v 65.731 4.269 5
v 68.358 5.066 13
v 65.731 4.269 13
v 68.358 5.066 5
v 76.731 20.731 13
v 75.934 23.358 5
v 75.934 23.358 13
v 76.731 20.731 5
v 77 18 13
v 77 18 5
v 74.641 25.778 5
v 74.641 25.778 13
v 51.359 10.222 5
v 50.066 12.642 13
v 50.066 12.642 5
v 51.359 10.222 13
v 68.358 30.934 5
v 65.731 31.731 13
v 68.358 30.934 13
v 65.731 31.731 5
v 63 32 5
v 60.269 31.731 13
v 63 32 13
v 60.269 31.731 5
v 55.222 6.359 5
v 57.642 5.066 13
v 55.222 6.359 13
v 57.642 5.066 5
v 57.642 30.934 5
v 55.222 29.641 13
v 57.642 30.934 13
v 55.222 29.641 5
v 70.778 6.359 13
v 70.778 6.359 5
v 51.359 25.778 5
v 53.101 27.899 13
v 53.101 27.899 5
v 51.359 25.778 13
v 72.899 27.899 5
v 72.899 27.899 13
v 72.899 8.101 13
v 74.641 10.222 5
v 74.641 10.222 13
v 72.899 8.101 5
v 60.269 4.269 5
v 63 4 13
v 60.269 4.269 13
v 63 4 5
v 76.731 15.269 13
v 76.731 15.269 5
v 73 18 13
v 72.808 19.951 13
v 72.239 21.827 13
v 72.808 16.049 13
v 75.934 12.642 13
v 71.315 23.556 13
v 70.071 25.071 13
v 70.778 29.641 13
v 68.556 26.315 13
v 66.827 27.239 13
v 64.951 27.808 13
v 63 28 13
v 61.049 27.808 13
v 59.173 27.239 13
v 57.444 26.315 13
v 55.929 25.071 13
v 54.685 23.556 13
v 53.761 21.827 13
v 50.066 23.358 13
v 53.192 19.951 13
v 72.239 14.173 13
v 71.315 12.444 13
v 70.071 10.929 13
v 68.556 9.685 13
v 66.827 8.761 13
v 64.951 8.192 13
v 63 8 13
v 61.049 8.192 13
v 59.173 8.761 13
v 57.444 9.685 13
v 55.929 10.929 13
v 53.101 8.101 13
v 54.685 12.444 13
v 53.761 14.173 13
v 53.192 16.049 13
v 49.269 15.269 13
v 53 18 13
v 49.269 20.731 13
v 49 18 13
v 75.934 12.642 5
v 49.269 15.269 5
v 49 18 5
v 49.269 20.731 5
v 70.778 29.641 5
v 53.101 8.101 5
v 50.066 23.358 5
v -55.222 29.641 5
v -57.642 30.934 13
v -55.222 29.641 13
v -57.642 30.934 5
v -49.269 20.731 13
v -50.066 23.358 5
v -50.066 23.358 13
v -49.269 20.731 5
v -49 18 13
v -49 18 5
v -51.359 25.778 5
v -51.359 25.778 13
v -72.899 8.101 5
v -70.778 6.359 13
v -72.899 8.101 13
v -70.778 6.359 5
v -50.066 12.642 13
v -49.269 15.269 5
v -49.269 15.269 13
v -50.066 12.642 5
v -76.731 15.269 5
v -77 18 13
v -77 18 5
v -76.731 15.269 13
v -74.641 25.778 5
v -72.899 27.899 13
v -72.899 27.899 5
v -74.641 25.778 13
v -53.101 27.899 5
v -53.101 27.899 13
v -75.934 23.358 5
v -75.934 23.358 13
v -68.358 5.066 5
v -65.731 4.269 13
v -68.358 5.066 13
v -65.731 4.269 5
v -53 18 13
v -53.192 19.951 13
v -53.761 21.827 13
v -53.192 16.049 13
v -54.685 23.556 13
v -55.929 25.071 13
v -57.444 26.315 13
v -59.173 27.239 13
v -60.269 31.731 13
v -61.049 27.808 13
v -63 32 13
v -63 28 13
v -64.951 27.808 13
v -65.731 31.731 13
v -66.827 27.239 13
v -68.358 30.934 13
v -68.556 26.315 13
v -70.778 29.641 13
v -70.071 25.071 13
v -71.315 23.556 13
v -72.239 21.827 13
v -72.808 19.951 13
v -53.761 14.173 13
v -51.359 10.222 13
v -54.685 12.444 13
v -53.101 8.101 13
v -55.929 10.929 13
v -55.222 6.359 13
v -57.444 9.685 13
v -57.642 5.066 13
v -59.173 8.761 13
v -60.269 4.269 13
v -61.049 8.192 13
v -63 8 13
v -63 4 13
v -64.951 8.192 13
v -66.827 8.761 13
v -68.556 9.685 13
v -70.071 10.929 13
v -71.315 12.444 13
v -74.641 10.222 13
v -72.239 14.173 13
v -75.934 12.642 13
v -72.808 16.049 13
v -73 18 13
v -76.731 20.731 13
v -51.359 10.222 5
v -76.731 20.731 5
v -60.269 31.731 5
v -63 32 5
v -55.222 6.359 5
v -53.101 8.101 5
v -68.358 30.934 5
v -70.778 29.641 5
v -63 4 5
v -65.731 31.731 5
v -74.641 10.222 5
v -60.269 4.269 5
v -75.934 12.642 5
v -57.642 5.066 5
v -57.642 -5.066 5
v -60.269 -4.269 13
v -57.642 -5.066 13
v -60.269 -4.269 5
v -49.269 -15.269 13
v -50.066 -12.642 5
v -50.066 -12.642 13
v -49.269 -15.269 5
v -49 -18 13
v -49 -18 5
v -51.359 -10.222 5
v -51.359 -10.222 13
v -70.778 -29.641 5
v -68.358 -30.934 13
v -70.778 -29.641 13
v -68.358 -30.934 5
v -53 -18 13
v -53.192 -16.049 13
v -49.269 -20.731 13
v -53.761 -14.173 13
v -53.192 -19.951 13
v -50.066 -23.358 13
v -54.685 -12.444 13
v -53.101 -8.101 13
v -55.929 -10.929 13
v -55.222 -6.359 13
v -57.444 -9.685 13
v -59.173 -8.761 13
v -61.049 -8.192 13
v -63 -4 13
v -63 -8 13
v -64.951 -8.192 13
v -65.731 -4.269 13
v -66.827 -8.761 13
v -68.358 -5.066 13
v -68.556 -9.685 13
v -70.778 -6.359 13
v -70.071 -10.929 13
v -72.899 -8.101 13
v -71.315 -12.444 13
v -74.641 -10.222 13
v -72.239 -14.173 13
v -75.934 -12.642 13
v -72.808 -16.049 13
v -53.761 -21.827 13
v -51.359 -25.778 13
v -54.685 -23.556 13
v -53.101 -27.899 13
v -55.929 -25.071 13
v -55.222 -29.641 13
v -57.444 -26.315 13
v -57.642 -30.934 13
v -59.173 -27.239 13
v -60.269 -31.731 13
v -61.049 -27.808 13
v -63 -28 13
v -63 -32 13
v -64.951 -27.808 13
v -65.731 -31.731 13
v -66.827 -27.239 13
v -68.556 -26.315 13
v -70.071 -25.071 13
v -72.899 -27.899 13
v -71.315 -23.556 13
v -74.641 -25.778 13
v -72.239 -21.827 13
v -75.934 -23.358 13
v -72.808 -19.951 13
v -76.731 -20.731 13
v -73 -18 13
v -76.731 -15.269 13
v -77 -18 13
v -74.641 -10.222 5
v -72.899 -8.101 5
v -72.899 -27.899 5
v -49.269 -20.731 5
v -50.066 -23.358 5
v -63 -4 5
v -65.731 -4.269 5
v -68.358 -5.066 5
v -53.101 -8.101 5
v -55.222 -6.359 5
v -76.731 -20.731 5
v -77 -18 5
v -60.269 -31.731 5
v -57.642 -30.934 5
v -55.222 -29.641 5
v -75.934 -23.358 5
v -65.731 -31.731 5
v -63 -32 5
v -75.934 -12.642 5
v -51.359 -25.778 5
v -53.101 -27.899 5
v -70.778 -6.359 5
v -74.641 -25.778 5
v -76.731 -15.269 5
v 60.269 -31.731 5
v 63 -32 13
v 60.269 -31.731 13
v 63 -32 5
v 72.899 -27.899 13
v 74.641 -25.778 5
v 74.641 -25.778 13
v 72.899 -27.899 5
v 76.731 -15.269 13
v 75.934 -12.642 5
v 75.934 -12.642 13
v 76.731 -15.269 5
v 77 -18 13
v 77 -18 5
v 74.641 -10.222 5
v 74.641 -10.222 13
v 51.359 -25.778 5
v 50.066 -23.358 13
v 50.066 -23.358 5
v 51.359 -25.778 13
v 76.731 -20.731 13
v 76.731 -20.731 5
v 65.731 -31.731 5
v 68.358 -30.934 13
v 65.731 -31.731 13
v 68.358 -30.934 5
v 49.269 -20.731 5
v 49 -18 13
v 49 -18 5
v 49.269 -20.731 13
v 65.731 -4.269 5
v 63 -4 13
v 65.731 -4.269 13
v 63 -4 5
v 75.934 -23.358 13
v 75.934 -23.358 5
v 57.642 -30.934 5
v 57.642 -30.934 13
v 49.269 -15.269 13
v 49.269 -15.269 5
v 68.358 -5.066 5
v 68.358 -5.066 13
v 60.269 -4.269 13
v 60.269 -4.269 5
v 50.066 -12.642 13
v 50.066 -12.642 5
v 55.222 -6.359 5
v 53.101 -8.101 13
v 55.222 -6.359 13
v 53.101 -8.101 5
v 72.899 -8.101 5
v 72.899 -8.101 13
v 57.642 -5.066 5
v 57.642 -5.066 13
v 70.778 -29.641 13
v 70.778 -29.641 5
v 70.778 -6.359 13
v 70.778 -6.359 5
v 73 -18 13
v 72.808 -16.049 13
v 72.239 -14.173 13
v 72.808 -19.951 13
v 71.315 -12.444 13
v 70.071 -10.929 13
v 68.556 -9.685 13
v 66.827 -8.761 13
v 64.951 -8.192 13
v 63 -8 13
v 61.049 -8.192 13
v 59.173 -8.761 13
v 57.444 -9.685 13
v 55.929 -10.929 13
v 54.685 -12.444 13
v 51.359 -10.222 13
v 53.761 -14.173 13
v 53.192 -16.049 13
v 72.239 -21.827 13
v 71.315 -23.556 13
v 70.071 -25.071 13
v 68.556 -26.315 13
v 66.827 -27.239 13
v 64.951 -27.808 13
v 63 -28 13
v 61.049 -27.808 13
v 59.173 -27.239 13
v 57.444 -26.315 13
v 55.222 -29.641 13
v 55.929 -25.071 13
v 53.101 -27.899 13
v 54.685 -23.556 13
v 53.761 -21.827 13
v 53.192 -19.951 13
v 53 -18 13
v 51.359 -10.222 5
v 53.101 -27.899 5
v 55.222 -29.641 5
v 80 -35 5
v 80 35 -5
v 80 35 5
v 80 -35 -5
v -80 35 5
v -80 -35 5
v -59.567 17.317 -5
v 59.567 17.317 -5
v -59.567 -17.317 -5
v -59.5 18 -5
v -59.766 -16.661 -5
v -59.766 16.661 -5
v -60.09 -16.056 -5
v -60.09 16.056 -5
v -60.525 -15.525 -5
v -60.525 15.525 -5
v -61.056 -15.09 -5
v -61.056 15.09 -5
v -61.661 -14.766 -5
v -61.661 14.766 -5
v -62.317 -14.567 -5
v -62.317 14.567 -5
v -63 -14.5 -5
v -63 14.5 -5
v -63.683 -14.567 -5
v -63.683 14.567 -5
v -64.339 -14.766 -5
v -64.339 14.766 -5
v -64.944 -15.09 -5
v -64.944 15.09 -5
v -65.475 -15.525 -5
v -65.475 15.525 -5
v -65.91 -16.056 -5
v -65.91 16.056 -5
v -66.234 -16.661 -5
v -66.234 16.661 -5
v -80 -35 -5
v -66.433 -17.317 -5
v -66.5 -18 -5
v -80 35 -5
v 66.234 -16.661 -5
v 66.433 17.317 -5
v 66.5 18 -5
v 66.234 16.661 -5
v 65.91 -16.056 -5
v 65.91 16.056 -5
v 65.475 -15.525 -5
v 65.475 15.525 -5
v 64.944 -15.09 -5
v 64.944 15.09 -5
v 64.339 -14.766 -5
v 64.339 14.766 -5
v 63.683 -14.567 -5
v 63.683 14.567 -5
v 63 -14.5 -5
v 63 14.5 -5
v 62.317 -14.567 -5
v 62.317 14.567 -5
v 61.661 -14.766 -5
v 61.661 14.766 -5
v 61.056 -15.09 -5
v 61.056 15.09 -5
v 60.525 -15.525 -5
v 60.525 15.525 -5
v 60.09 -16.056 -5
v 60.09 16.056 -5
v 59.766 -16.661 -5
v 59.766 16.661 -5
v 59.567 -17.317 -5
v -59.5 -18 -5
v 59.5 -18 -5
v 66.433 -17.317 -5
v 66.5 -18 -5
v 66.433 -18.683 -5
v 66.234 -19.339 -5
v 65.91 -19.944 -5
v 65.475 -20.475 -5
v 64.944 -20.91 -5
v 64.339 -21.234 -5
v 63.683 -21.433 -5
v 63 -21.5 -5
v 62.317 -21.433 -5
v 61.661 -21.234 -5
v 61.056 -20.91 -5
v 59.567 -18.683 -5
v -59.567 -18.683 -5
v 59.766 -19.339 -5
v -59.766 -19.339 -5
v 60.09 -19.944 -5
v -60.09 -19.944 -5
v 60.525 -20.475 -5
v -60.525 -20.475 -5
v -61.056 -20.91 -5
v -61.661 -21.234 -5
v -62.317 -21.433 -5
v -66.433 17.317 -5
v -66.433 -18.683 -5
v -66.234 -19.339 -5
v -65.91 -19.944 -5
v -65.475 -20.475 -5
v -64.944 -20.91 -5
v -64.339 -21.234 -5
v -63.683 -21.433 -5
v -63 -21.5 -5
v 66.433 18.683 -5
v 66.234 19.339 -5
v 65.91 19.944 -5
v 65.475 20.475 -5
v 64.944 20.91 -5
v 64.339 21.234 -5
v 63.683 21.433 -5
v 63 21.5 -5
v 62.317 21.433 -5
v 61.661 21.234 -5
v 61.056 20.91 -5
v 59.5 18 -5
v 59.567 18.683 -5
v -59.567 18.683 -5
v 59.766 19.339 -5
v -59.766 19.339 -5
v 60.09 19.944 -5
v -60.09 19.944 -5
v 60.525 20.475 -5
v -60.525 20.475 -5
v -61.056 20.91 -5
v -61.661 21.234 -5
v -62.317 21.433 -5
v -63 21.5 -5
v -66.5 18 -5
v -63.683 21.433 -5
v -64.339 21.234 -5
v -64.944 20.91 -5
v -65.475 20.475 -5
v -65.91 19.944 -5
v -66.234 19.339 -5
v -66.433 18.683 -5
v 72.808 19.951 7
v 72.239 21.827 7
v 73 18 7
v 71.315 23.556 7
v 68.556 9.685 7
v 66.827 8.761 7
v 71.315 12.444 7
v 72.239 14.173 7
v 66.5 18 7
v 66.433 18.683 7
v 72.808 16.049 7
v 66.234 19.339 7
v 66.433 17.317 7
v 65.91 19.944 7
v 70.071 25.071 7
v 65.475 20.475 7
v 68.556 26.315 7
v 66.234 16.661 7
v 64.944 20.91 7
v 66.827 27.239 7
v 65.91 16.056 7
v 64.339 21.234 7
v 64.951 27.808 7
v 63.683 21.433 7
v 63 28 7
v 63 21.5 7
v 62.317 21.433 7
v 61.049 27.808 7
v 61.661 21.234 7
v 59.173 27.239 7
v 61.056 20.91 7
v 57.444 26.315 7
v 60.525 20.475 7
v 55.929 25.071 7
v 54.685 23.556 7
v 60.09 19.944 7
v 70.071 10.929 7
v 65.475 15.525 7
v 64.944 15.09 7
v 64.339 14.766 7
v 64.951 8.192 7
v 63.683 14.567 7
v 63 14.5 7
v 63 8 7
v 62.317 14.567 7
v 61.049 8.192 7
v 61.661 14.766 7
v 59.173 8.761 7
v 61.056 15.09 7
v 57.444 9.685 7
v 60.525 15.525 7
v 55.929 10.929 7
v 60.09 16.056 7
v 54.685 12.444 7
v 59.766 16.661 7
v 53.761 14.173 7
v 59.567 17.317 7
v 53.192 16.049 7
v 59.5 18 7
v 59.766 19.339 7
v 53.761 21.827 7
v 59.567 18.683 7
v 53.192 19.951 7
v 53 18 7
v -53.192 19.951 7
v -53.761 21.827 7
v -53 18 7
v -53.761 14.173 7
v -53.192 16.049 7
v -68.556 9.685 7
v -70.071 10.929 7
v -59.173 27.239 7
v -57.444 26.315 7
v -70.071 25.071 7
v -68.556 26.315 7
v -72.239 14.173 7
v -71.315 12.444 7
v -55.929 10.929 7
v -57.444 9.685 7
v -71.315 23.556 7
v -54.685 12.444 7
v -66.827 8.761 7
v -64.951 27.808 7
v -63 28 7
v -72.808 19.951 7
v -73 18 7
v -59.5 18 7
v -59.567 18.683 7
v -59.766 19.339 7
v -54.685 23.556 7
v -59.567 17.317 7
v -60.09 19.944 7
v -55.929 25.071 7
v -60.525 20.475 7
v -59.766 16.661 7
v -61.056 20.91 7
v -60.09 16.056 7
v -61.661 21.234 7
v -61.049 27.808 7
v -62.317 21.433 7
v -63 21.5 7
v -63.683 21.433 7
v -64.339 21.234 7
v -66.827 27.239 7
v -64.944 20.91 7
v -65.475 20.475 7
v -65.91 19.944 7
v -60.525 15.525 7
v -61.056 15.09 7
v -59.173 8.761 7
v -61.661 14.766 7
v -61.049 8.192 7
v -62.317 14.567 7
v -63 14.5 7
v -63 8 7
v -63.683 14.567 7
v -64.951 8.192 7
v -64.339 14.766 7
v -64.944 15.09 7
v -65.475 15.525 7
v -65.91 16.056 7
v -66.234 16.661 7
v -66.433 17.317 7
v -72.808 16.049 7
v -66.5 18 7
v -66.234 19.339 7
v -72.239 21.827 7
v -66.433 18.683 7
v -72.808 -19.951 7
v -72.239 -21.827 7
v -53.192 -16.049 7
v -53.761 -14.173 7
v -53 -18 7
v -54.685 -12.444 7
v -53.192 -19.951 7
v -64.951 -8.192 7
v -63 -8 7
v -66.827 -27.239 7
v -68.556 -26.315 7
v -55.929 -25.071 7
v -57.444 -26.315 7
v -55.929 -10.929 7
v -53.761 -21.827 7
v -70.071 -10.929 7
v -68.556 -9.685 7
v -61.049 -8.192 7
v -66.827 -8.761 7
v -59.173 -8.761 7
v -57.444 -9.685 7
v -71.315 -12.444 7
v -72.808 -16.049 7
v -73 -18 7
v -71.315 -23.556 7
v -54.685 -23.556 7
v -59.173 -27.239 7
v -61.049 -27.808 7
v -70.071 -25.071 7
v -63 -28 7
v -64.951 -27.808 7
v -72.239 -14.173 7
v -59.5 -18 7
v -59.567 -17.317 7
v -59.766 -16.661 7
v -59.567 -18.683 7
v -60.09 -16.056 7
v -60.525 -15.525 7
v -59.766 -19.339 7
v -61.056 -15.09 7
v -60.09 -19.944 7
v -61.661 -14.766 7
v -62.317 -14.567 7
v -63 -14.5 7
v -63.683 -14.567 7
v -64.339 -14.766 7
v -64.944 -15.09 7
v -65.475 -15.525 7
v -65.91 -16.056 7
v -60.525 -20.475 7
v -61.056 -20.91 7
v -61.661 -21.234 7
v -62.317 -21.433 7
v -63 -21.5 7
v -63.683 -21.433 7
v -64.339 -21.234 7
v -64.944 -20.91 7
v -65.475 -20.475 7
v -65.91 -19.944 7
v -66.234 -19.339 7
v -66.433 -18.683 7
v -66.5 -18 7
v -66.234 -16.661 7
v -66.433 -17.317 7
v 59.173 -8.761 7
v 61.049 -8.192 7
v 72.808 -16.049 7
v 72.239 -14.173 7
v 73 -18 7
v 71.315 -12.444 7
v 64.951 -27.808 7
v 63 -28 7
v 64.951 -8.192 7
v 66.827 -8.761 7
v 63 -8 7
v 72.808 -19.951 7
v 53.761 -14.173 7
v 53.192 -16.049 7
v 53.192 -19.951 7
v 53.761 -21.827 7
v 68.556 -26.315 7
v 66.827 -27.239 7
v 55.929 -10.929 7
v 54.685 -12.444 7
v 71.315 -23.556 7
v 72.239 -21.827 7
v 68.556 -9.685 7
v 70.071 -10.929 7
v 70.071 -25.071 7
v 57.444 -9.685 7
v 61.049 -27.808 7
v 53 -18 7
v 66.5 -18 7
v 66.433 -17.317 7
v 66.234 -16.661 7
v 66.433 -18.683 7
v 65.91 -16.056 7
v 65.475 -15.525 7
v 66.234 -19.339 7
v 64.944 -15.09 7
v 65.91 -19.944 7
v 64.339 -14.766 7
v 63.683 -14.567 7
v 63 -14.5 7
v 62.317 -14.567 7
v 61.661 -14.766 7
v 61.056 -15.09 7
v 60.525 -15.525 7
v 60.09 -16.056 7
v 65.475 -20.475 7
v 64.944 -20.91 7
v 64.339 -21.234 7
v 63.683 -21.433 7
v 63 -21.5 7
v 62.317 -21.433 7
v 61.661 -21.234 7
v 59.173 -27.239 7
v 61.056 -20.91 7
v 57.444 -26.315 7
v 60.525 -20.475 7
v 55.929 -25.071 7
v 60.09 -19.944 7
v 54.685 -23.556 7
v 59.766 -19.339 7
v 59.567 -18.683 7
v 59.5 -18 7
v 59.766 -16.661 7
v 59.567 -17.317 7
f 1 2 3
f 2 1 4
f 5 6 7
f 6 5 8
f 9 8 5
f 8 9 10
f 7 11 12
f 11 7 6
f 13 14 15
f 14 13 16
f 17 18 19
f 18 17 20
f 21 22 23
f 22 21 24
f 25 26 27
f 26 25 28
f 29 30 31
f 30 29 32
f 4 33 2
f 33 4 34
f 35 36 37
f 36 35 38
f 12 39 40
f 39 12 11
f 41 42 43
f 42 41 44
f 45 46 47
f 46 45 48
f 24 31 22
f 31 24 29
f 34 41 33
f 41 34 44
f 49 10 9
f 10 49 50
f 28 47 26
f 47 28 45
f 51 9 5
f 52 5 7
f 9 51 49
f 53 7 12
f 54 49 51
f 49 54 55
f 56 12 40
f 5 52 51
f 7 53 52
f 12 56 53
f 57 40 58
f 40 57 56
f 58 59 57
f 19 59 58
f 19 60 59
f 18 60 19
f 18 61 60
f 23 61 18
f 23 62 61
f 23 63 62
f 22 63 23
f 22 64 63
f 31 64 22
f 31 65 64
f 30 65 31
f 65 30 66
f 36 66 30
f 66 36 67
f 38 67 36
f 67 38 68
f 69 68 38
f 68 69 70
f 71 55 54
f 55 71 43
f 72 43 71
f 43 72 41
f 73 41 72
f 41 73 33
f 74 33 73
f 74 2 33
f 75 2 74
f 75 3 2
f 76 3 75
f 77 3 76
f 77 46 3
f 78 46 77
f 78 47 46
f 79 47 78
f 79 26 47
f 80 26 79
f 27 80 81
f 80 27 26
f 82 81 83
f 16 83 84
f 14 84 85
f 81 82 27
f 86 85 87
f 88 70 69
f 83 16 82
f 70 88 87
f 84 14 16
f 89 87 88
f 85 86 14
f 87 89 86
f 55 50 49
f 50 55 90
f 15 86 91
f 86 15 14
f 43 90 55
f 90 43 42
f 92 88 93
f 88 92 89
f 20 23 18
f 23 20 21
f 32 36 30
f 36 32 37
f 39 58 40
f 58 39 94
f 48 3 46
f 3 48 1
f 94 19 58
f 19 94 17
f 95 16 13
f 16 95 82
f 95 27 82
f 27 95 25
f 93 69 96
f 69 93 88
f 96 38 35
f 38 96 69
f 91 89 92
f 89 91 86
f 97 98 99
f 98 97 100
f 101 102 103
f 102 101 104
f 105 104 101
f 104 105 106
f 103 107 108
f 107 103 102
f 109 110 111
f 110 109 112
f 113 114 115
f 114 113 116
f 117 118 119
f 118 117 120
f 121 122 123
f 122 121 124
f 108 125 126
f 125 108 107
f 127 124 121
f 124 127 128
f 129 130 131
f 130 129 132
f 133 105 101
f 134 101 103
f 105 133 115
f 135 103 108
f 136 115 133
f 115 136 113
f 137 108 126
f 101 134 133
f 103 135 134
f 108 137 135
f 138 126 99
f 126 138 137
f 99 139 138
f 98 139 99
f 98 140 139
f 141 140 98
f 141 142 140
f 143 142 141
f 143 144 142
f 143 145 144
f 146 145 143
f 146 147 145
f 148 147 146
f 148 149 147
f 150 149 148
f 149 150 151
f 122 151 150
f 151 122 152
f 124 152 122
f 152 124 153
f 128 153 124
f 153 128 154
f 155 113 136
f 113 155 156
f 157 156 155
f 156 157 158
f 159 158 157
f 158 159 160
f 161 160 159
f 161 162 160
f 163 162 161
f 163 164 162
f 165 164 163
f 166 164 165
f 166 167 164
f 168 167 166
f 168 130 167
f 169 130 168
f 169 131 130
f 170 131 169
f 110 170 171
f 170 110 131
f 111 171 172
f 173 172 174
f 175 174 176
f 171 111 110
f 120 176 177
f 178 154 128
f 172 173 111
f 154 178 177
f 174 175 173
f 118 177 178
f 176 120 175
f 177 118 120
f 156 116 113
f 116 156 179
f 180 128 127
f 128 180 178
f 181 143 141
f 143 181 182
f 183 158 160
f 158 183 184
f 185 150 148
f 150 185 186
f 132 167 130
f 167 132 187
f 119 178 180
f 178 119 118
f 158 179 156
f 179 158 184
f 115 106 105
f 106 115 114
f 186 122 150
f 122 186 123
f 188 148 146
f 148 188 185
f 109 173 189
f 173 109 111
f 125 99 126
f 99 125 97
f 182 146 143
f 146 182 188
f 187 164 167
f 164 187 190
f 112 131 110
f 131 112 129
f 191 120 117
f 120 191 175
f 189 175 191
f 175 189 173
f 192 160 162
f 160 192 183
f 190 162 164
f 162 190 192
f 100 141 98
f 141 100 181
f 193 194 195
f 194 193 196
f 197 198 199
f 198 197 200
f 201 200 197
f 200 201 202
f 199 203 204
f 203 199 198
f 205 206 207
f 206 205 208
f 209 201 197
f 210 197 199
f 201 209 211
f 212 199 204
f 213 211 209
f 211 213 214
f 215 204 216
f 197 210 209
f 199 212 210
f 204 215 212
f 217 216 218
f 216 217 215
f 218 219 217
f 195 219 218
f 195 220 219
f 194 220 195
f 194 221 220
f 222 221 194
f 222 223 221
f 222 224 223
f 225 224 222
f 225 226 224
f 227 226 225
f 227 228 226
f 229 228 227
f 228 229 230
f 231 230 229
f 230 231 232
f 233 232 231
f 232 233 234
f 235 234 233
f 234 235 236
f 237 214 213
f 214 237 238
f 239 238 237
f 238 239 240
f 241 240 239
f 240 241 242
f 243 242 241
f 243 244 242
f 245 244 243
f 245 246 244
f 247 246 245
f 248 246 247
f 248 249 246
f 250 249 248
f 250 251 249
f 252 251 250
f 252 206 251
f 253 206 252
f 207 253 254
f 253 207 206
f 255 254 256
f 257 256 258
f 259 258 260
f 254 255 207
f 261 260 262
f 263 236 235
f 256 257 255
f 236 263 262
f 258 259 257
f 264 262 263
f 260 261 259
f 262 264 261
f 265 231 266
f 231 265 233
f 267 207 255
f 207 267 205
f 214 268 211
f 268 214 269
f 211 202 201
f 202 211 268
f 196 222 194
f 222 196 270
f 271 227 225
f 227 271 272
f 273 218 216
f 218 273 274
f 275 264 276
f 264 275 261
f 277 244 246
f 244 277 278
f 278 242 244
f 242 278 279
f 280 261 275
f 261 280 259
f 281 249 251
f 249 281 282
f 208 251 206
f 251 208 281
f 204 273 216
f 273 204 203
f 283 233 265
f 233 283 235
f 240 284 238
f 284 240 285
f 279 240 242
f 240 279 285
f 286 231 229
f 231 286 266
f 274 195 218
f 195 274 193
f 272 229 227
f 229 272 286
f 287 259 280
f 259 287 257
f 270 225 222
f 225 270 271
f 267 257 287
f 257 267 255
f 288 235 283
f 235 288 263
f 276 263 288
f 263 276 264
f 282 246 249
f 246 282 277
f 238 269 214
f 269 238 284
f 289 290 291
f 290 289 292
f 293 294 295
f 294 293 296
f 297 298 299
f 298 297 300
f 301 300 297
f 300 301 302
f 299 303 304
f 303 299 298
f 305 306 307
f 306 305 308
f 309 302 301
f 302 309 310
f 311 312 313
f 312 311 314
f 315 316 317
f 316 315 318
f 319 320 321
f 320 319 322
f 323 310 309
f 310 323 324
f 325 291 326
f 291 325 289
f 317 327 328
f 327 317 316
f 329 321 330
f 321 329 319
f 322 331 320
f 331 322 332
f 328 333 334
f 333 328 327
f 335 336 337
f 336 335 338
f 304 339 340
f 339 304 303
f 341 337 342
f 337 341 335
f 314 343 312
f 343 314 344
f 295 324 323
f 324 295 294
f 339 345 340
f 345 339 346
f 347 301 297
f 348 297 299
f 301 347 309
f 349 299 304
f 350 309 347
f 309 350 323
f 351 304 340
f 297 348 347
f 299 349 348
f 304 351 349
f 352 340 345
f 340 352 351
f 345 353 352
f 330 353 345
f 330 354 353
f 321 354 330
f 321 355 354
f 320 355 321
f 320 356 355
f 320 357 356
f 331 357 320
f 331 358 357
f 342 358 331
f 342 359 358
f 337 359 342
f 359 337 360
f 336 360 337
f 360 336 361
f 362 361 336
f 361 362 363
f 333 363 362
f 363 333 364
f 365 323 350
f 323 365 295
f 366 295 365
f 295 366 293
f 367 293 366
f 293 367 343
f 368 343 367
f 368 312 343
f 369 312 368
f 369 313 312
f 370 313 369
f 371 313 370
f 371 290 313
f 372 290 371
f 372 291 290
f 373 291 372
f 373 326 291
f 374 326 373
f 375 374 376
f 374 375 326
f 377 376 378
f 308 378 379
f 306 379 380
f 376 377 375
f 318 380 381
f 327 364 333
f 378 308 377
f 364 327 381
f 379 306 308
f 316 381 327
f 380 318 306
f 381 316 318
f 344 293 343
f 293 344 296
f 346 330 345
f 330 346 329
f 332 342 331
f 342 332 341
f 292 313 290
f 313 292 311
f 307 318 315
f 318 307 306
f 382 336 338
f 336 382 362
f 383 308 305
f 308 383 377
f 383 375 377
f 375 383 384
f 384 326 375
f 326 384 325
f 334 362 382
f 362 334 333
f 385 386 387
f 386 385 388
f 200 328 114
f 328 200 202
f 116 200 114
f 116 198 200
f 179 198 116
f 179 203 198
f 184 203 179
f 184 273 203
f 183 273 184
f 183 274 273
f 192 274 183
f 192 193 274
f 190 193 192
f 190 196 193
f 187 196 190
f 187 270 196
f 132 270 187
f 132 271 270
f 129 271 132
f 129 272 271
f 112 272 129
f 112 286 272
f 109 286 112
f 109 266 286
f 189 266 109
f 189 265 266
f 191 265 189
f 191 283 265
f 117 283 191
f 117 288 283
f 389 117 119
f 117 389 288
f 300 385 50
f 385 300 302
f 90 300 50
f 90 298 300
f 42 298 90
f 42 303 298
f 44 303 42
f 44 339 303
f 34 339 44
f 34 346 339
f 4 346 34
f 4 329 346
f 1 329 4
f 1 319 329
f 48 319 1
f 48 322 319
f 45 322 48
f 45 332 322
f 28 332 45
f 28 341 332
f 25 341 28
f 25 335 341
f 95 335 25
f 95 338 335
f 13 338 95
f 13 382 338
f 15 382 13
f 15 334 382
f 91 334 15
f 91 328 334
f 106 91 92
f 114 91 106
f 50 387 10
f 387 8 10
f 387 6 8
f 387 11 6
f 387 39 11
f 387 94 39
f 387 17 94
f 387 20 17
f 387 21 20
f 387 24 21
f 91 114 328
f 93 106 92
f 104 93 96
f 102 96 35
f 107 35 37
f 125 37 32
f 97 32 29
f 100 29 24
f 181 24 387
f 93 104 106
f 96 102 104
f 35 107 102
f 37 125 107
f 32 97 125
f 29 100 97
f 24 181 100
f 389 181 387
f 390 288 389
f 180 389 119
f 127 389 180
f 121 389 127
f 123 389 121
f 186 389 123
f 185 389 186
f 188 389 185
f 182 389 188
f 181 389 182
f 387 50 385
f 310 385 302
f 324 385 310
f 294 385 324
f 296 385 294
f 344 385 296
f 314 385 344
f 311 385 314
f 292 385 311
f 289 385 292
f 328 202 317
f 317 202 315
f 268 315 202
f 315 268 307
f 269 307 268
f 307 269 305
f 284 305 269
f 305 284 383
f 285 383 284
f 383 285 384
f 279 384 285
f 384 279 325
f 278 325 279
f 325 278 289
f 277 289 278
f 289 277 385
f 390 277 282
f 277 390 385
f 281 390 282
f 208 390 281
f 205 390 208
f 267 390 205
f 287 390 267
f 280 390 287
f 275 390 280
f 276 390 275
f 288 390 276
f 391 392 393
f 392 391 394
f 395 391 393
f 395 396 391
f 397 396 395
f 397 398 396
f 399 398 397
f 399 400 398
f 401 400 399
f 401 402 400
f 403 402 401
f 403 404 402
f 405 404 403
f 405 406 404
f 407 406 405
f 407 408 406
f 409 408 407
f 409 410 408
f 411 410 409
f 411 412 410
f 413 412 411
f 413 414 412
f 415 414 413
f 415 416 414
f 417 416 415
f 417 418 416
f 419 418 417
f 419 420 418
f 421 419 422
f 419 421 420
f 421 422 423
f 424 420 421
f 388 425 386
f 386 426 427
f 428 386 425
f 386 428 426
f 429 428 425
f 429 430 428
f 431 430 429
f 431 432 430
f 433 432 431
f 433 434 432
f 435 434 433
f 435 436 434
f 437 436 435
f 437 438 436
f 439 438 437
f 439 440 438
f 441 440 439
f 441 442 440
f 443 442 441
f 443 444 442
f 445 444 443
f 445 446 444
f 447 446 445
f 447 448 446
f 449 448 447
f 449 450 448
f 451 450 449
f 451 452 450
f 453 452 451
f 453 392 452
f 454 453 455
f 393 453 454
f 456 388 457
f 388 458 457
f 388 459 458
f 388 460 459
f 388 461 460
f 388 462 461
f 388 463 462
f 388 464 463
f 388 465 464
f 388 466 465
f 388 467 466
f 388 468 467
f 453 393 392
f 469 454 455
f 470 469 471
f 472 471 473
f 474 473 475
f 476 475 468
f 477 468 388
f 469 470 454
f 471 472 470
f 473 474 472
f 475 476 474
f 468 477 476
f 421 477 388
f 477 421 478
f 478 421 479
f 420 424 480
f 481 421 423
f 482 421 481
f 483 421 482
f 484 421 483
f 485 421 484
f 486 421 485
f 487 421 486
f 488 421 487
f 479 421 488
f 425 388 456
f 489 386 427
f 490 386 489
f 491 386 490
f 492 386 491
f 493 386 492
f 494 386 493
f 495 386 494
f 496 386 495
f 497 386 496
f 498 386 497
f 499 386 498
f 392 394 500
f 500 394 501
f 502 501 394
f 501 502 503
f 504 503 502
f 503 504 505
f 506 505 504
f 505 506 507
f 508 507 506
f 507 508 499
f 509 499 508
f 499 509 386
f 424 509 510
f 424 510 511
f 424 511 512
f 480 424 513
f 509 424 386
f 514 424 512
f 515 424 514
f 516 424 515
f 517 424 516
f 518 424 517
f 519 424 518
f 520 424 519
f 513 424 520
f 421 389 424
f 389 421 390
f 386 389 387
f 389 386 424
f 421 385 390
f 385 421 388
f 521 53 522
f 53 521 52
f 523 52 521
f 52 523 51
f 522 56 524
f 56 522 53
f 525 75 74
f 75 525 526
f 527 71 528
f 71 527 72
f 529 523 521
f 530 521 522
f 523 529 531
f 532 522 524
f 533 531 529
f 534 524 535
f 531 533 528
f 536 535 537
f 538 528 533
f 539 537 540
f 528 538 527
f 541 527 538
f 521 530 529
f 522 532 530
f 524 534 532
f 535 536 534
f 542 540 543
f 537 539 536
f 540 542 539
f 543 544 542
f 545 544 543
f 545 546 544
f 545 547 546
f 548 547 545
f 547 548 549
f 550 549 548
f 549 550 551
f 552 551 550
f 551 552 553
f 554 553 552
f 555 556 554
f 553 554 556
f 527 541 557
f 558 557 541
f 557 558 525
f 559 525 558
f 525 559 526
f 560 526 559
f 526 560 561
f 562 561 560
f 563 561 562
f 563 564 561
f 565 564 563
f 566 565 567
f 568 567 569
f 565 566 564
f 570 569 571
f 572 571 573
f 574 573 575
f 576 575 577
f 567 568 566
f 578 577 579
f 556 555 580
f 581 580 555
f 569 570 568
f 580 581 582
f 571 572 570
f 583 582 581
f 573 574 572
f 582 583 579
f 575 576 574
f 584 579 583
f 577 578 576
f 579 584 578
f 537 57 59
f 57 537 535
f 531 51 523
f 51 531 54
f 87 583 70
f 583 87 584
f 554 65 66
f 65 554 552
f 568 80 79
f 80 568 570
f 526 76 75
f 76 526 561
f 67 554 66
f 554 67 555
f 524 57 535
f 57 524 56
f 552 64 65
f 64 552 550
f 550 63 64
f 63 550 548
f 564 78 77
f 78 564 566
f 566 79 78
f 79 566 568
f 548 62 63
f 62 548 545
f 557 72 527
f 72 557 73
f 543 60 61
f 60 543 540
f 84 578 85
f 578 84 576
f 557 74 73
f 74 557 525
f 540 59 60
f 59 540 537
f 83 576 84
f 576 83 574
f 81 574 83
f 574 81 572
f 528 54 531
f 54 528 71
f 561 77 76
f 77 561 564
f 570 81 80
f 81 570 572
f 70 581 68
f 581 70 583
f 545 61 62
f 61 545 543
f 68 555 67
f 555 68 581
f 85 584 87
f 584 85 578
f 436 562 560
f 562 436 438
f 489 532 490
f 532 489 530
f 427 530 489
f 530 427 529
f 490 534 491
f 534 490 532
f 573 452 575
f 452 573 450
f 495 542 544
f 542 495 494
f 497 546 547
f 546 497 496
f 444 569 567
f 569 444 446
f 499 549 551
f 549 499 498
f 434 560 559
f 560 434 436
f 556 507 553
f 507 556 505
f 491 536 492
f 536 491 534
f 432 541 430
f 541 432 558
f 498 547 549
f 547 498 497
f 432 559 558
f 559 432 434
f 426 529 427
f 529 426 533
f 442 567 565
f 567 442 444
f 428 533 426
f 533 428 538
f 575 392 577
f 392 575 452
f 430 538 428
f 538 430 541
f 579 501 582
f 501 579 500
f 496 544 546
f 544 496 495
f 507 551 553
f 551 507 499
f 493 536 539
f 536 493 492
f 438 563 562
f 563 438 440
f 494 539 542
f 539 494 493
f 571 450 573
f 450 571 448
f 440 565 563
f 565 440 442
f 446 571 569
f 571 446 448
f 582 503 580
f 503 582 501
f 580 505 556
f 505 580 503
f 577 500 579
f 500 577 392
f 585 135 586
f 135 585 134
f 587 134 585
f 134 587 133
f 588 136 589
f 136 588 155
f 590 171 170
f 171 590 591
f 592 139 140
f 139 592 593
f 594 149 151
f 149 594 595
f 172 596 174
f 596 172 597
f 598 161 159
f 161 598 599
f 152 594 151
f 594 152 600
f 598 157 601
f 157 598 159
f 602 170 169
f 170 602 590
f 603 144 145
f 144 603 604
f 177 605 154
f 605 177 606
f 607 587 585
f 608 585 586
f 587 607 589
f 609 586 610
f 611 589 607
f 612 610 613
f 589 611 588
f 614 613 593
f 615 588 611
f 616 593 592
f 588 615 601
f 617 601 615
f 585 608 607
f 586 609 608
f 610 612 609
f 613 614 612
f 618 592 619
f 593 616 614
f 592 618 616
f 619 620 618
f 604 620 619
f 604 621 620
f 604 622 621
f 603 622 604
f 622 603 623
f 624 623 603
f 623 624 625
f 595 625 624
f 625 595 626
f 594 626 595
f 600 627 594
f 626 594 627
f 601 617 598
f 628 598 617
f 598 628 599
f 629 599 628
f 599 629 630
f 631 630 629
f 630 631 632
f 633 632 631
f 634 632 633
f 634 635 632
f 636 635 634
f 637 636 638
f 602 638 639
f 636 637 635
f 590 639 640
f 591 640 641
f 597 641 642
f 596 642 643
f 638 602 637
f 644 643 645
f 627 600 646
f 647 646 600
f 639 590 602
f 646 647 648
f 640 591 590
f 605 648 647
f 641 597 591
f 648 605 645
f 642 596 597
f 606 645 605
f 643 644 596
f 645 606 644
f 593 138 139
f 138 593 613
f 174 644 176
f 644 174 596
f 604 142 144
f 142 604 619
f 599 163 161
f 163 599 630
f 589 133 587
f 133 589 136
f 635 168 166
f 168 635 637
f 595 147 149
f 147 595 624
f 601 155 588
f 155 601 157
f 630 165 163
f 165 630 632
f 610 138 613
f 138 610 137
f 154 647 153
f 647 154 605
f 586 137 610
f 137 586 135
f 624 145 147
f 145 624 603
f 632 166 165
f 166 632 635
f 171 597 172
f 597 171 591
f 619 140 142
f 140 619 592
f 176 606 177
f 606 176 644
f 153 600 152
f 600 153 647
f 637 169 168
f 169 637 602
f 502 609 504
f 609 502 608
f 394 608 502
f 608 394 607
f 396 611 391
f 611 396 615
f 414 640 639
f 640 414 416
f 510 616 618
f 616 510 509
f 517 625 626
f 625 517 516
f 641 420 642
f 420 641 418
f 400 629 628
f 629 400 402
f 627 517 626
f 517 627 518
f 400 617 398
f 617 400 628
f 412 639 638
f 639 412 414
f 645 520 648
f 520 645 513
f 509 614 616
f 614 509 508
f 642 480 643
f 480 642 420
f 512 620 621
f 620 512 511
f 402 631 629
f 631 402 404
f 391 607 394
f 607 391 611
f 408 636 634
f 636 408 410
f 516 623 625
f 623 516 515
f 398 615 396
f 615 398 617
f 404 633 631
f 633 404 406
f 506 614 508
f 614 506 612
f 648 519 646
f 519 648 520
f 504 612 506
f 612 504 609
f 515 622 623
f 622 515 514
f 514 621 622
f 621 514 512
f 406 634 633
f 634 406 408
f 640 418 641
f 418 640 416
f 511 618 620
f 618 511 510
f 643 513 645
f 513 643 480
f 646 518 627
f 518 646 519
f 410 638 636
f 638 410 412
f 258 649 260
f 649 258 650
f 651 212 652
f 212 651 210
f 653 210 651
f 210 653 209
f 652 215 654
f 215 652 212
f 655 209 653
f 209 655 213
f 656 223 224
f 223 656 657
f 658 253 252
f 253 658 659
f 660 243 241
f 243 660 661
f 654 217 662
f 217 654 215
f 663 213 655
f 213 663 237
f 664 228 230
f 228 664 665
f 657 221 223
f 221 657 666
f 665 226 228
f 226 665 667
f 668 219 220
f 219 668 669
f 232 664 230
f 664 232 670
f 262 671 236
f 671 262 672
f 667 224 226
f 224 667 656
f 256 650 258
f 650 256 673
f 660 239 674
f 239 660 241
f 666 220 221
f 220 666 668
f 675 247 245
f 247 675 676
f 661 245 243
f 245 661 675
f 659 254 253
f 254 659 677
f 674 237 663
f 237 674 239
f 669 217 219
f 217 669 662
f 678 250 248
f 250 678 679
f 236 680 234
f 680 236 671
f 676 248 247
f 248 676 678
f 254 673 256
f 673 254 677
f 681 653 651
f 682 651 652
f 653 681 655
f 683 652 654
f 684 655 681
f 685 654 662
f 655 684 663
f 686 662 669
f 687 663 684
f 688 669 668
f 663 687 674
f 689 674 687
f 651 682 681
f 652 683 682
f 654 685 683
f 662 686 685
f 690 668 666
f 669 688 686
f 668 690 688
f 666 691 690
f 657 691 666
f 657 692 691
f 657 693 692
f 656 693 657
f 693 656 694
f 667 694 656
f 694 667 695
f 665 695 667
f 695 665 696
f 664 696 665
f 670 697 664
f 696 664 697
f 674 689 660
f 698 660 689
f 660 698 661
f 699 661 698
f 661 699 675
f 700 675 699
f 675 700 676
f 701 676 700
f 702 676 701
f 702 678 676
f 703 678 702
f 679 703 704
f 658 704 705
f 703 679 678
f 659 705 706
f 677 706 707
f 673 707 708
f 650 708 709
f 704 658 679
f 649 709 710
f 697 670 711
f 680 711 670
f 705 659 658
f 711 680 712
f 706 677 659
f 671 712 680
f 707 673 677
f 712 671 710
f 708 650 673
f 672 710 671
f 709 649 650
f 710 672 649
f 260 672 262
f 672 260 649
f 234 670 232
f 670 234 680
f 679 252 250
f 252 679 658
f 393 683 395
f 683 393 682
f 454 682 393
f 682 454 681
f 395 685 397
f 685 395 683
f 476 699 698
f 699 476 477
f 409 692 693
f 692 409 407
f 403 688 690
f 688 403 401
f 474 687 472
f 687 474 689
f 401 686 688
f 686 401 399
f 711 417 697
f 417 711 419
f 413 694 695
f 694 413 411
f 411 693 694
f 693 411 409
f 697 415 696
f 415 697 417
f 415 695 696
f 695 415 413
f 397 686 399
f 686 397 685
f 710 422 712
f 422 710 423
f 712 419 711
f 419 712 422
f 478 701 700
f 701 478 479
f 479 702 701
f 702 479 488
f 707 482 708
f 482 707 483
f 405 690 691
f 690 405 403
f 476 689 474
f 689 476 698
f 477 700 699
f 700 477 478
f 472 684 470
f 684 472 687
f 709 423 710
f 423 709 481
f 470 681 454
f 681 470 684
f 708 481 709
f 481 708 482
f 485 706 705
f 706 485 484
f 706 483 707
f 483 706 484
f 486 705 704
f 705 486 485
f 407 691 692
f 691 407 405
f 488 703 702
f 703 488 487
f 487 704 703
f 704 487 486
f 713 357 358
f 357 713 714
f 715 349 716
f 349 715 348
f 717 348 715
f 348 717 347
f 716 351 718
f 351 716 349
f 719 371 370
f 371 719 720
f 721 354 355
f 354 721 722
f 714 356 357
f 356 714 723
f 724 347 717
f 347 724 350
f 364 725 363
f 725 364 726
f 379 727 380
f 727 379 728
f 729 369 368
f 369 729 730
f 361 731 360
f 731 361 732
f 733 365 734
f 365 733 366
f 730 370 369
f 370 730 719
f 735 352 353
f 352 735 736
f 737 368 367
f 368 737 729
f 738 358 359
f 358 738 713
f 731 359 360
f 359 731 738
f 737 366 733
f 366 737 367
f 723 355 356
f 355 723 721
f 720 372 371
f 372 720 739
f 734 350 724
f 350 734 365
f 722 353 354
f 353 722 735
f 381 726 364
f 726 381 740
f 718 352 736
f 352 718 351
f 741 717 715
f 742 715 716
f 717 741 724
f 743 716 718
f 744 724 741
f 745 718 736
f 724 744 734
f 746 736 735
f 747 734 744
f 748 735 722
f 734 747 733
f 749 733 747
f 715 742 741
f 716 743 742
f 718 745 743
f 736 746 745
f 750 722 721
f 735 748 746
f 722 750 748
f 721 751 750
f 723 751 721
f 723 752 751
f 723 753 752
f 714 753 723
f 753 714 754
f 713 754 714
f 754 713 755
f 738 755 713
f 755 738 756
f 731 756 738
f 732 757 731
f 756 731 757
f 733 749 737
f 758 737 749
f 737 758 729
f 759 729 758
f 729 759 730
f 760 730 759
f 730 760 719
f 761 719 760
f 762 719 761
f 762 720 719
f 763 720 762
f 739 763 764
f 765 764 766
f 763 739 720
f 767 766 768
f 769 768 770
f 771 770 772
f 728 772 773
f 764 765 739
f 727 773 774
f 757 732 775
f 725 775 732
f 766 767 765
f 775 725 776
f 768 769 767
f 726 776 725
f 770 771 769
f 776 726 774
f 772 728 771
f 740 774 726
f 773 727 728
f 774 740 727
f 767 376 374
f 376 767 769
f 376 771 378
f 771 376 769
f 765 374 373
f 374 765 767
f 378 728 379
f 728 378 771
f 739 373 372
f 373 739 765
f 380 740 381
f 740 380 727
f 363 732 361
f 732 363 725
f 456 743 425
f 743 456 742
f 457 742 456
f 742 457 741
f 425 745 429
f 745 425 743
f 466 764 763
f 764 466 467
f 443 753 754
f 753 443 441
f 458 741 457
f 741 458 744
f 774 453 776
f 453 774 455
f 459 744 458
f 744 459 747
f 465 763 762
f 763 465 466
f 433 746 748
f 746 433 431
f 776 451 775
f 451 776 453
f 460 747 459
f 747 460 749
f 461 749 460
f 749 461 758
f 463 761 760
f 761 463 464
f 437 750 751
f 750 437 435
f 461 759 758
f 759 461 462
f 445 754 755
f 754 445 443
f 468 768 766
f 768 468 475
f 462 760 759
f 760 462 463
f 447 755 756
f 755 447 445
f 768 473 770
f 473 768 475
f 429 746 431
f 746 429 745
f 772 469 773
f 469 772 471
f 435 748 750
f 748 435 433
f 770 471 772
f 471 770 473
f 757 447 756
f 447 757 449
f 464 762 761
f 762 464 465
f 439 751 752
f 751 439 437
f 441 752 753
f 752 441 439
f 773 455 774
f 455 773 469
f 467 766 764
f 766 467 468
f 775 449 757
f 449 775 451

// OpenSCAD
$fn = 32;

// ----------------------------------------------------------------------
// Socket pad plate
// bosses with counterbored sockets for the screws
// ----------------------------------------------------------------------

// --- parameters (mm) ---
base_t = 10;            // base plate thickness
boss_h = 8;             // boss height above the base plate
boss_d = 28;            // boss diameter
socket_d = 20;          // socket diameter
socket_depth = 6;       // socket depth from the boss face
bolt_d = 7;             // screw clearance hole through the socket floor
plate = [160, 70, 10];  // overall size (x, y, z)
edge = 17;              // boss centre offset from the plate edge
pads = 4;               // boss count, one per corner

// --- derived feature positions (mm) ---
height = base_t + boss_h;        // = 18   overall height of the part
corner_x = plate[0] / 2 - edge;  // = 63   boss centre X
corner_y = plate[1] / 2 - edge;  // = 18   boss centre Y
feature_centers = [
  [corner_x, corner_y],
  [-corner_x, corner_y],
  [-corner_x, -corner_y],
  [corner_x, -corner_y]
];   // boss centres: sockets, holes and the pads themselves are placed from here

// base plate, bosses on feature_centers, socket + through hole in each
difference() {
  union() {
    cube(plate, center = true);
    for (centre = feature_centers)
      translate([centre[0], centre[1], plate[2] / 2 - 1])
        cylinder(d = boss_d, h = boss_h + 1);
  }
  for (centre = feature_centers) {
    translate([centre[0], centre[1], plate[2] / 2 + boss_h - socket_depth])
      cylinder(d = socket_d, h = socket_depth + 1);
    translate([centre[0], centre[1], -height])
      cylinder(d = bolt_d, h = 2 * height + 2);  // through the socket floor
  }
}
